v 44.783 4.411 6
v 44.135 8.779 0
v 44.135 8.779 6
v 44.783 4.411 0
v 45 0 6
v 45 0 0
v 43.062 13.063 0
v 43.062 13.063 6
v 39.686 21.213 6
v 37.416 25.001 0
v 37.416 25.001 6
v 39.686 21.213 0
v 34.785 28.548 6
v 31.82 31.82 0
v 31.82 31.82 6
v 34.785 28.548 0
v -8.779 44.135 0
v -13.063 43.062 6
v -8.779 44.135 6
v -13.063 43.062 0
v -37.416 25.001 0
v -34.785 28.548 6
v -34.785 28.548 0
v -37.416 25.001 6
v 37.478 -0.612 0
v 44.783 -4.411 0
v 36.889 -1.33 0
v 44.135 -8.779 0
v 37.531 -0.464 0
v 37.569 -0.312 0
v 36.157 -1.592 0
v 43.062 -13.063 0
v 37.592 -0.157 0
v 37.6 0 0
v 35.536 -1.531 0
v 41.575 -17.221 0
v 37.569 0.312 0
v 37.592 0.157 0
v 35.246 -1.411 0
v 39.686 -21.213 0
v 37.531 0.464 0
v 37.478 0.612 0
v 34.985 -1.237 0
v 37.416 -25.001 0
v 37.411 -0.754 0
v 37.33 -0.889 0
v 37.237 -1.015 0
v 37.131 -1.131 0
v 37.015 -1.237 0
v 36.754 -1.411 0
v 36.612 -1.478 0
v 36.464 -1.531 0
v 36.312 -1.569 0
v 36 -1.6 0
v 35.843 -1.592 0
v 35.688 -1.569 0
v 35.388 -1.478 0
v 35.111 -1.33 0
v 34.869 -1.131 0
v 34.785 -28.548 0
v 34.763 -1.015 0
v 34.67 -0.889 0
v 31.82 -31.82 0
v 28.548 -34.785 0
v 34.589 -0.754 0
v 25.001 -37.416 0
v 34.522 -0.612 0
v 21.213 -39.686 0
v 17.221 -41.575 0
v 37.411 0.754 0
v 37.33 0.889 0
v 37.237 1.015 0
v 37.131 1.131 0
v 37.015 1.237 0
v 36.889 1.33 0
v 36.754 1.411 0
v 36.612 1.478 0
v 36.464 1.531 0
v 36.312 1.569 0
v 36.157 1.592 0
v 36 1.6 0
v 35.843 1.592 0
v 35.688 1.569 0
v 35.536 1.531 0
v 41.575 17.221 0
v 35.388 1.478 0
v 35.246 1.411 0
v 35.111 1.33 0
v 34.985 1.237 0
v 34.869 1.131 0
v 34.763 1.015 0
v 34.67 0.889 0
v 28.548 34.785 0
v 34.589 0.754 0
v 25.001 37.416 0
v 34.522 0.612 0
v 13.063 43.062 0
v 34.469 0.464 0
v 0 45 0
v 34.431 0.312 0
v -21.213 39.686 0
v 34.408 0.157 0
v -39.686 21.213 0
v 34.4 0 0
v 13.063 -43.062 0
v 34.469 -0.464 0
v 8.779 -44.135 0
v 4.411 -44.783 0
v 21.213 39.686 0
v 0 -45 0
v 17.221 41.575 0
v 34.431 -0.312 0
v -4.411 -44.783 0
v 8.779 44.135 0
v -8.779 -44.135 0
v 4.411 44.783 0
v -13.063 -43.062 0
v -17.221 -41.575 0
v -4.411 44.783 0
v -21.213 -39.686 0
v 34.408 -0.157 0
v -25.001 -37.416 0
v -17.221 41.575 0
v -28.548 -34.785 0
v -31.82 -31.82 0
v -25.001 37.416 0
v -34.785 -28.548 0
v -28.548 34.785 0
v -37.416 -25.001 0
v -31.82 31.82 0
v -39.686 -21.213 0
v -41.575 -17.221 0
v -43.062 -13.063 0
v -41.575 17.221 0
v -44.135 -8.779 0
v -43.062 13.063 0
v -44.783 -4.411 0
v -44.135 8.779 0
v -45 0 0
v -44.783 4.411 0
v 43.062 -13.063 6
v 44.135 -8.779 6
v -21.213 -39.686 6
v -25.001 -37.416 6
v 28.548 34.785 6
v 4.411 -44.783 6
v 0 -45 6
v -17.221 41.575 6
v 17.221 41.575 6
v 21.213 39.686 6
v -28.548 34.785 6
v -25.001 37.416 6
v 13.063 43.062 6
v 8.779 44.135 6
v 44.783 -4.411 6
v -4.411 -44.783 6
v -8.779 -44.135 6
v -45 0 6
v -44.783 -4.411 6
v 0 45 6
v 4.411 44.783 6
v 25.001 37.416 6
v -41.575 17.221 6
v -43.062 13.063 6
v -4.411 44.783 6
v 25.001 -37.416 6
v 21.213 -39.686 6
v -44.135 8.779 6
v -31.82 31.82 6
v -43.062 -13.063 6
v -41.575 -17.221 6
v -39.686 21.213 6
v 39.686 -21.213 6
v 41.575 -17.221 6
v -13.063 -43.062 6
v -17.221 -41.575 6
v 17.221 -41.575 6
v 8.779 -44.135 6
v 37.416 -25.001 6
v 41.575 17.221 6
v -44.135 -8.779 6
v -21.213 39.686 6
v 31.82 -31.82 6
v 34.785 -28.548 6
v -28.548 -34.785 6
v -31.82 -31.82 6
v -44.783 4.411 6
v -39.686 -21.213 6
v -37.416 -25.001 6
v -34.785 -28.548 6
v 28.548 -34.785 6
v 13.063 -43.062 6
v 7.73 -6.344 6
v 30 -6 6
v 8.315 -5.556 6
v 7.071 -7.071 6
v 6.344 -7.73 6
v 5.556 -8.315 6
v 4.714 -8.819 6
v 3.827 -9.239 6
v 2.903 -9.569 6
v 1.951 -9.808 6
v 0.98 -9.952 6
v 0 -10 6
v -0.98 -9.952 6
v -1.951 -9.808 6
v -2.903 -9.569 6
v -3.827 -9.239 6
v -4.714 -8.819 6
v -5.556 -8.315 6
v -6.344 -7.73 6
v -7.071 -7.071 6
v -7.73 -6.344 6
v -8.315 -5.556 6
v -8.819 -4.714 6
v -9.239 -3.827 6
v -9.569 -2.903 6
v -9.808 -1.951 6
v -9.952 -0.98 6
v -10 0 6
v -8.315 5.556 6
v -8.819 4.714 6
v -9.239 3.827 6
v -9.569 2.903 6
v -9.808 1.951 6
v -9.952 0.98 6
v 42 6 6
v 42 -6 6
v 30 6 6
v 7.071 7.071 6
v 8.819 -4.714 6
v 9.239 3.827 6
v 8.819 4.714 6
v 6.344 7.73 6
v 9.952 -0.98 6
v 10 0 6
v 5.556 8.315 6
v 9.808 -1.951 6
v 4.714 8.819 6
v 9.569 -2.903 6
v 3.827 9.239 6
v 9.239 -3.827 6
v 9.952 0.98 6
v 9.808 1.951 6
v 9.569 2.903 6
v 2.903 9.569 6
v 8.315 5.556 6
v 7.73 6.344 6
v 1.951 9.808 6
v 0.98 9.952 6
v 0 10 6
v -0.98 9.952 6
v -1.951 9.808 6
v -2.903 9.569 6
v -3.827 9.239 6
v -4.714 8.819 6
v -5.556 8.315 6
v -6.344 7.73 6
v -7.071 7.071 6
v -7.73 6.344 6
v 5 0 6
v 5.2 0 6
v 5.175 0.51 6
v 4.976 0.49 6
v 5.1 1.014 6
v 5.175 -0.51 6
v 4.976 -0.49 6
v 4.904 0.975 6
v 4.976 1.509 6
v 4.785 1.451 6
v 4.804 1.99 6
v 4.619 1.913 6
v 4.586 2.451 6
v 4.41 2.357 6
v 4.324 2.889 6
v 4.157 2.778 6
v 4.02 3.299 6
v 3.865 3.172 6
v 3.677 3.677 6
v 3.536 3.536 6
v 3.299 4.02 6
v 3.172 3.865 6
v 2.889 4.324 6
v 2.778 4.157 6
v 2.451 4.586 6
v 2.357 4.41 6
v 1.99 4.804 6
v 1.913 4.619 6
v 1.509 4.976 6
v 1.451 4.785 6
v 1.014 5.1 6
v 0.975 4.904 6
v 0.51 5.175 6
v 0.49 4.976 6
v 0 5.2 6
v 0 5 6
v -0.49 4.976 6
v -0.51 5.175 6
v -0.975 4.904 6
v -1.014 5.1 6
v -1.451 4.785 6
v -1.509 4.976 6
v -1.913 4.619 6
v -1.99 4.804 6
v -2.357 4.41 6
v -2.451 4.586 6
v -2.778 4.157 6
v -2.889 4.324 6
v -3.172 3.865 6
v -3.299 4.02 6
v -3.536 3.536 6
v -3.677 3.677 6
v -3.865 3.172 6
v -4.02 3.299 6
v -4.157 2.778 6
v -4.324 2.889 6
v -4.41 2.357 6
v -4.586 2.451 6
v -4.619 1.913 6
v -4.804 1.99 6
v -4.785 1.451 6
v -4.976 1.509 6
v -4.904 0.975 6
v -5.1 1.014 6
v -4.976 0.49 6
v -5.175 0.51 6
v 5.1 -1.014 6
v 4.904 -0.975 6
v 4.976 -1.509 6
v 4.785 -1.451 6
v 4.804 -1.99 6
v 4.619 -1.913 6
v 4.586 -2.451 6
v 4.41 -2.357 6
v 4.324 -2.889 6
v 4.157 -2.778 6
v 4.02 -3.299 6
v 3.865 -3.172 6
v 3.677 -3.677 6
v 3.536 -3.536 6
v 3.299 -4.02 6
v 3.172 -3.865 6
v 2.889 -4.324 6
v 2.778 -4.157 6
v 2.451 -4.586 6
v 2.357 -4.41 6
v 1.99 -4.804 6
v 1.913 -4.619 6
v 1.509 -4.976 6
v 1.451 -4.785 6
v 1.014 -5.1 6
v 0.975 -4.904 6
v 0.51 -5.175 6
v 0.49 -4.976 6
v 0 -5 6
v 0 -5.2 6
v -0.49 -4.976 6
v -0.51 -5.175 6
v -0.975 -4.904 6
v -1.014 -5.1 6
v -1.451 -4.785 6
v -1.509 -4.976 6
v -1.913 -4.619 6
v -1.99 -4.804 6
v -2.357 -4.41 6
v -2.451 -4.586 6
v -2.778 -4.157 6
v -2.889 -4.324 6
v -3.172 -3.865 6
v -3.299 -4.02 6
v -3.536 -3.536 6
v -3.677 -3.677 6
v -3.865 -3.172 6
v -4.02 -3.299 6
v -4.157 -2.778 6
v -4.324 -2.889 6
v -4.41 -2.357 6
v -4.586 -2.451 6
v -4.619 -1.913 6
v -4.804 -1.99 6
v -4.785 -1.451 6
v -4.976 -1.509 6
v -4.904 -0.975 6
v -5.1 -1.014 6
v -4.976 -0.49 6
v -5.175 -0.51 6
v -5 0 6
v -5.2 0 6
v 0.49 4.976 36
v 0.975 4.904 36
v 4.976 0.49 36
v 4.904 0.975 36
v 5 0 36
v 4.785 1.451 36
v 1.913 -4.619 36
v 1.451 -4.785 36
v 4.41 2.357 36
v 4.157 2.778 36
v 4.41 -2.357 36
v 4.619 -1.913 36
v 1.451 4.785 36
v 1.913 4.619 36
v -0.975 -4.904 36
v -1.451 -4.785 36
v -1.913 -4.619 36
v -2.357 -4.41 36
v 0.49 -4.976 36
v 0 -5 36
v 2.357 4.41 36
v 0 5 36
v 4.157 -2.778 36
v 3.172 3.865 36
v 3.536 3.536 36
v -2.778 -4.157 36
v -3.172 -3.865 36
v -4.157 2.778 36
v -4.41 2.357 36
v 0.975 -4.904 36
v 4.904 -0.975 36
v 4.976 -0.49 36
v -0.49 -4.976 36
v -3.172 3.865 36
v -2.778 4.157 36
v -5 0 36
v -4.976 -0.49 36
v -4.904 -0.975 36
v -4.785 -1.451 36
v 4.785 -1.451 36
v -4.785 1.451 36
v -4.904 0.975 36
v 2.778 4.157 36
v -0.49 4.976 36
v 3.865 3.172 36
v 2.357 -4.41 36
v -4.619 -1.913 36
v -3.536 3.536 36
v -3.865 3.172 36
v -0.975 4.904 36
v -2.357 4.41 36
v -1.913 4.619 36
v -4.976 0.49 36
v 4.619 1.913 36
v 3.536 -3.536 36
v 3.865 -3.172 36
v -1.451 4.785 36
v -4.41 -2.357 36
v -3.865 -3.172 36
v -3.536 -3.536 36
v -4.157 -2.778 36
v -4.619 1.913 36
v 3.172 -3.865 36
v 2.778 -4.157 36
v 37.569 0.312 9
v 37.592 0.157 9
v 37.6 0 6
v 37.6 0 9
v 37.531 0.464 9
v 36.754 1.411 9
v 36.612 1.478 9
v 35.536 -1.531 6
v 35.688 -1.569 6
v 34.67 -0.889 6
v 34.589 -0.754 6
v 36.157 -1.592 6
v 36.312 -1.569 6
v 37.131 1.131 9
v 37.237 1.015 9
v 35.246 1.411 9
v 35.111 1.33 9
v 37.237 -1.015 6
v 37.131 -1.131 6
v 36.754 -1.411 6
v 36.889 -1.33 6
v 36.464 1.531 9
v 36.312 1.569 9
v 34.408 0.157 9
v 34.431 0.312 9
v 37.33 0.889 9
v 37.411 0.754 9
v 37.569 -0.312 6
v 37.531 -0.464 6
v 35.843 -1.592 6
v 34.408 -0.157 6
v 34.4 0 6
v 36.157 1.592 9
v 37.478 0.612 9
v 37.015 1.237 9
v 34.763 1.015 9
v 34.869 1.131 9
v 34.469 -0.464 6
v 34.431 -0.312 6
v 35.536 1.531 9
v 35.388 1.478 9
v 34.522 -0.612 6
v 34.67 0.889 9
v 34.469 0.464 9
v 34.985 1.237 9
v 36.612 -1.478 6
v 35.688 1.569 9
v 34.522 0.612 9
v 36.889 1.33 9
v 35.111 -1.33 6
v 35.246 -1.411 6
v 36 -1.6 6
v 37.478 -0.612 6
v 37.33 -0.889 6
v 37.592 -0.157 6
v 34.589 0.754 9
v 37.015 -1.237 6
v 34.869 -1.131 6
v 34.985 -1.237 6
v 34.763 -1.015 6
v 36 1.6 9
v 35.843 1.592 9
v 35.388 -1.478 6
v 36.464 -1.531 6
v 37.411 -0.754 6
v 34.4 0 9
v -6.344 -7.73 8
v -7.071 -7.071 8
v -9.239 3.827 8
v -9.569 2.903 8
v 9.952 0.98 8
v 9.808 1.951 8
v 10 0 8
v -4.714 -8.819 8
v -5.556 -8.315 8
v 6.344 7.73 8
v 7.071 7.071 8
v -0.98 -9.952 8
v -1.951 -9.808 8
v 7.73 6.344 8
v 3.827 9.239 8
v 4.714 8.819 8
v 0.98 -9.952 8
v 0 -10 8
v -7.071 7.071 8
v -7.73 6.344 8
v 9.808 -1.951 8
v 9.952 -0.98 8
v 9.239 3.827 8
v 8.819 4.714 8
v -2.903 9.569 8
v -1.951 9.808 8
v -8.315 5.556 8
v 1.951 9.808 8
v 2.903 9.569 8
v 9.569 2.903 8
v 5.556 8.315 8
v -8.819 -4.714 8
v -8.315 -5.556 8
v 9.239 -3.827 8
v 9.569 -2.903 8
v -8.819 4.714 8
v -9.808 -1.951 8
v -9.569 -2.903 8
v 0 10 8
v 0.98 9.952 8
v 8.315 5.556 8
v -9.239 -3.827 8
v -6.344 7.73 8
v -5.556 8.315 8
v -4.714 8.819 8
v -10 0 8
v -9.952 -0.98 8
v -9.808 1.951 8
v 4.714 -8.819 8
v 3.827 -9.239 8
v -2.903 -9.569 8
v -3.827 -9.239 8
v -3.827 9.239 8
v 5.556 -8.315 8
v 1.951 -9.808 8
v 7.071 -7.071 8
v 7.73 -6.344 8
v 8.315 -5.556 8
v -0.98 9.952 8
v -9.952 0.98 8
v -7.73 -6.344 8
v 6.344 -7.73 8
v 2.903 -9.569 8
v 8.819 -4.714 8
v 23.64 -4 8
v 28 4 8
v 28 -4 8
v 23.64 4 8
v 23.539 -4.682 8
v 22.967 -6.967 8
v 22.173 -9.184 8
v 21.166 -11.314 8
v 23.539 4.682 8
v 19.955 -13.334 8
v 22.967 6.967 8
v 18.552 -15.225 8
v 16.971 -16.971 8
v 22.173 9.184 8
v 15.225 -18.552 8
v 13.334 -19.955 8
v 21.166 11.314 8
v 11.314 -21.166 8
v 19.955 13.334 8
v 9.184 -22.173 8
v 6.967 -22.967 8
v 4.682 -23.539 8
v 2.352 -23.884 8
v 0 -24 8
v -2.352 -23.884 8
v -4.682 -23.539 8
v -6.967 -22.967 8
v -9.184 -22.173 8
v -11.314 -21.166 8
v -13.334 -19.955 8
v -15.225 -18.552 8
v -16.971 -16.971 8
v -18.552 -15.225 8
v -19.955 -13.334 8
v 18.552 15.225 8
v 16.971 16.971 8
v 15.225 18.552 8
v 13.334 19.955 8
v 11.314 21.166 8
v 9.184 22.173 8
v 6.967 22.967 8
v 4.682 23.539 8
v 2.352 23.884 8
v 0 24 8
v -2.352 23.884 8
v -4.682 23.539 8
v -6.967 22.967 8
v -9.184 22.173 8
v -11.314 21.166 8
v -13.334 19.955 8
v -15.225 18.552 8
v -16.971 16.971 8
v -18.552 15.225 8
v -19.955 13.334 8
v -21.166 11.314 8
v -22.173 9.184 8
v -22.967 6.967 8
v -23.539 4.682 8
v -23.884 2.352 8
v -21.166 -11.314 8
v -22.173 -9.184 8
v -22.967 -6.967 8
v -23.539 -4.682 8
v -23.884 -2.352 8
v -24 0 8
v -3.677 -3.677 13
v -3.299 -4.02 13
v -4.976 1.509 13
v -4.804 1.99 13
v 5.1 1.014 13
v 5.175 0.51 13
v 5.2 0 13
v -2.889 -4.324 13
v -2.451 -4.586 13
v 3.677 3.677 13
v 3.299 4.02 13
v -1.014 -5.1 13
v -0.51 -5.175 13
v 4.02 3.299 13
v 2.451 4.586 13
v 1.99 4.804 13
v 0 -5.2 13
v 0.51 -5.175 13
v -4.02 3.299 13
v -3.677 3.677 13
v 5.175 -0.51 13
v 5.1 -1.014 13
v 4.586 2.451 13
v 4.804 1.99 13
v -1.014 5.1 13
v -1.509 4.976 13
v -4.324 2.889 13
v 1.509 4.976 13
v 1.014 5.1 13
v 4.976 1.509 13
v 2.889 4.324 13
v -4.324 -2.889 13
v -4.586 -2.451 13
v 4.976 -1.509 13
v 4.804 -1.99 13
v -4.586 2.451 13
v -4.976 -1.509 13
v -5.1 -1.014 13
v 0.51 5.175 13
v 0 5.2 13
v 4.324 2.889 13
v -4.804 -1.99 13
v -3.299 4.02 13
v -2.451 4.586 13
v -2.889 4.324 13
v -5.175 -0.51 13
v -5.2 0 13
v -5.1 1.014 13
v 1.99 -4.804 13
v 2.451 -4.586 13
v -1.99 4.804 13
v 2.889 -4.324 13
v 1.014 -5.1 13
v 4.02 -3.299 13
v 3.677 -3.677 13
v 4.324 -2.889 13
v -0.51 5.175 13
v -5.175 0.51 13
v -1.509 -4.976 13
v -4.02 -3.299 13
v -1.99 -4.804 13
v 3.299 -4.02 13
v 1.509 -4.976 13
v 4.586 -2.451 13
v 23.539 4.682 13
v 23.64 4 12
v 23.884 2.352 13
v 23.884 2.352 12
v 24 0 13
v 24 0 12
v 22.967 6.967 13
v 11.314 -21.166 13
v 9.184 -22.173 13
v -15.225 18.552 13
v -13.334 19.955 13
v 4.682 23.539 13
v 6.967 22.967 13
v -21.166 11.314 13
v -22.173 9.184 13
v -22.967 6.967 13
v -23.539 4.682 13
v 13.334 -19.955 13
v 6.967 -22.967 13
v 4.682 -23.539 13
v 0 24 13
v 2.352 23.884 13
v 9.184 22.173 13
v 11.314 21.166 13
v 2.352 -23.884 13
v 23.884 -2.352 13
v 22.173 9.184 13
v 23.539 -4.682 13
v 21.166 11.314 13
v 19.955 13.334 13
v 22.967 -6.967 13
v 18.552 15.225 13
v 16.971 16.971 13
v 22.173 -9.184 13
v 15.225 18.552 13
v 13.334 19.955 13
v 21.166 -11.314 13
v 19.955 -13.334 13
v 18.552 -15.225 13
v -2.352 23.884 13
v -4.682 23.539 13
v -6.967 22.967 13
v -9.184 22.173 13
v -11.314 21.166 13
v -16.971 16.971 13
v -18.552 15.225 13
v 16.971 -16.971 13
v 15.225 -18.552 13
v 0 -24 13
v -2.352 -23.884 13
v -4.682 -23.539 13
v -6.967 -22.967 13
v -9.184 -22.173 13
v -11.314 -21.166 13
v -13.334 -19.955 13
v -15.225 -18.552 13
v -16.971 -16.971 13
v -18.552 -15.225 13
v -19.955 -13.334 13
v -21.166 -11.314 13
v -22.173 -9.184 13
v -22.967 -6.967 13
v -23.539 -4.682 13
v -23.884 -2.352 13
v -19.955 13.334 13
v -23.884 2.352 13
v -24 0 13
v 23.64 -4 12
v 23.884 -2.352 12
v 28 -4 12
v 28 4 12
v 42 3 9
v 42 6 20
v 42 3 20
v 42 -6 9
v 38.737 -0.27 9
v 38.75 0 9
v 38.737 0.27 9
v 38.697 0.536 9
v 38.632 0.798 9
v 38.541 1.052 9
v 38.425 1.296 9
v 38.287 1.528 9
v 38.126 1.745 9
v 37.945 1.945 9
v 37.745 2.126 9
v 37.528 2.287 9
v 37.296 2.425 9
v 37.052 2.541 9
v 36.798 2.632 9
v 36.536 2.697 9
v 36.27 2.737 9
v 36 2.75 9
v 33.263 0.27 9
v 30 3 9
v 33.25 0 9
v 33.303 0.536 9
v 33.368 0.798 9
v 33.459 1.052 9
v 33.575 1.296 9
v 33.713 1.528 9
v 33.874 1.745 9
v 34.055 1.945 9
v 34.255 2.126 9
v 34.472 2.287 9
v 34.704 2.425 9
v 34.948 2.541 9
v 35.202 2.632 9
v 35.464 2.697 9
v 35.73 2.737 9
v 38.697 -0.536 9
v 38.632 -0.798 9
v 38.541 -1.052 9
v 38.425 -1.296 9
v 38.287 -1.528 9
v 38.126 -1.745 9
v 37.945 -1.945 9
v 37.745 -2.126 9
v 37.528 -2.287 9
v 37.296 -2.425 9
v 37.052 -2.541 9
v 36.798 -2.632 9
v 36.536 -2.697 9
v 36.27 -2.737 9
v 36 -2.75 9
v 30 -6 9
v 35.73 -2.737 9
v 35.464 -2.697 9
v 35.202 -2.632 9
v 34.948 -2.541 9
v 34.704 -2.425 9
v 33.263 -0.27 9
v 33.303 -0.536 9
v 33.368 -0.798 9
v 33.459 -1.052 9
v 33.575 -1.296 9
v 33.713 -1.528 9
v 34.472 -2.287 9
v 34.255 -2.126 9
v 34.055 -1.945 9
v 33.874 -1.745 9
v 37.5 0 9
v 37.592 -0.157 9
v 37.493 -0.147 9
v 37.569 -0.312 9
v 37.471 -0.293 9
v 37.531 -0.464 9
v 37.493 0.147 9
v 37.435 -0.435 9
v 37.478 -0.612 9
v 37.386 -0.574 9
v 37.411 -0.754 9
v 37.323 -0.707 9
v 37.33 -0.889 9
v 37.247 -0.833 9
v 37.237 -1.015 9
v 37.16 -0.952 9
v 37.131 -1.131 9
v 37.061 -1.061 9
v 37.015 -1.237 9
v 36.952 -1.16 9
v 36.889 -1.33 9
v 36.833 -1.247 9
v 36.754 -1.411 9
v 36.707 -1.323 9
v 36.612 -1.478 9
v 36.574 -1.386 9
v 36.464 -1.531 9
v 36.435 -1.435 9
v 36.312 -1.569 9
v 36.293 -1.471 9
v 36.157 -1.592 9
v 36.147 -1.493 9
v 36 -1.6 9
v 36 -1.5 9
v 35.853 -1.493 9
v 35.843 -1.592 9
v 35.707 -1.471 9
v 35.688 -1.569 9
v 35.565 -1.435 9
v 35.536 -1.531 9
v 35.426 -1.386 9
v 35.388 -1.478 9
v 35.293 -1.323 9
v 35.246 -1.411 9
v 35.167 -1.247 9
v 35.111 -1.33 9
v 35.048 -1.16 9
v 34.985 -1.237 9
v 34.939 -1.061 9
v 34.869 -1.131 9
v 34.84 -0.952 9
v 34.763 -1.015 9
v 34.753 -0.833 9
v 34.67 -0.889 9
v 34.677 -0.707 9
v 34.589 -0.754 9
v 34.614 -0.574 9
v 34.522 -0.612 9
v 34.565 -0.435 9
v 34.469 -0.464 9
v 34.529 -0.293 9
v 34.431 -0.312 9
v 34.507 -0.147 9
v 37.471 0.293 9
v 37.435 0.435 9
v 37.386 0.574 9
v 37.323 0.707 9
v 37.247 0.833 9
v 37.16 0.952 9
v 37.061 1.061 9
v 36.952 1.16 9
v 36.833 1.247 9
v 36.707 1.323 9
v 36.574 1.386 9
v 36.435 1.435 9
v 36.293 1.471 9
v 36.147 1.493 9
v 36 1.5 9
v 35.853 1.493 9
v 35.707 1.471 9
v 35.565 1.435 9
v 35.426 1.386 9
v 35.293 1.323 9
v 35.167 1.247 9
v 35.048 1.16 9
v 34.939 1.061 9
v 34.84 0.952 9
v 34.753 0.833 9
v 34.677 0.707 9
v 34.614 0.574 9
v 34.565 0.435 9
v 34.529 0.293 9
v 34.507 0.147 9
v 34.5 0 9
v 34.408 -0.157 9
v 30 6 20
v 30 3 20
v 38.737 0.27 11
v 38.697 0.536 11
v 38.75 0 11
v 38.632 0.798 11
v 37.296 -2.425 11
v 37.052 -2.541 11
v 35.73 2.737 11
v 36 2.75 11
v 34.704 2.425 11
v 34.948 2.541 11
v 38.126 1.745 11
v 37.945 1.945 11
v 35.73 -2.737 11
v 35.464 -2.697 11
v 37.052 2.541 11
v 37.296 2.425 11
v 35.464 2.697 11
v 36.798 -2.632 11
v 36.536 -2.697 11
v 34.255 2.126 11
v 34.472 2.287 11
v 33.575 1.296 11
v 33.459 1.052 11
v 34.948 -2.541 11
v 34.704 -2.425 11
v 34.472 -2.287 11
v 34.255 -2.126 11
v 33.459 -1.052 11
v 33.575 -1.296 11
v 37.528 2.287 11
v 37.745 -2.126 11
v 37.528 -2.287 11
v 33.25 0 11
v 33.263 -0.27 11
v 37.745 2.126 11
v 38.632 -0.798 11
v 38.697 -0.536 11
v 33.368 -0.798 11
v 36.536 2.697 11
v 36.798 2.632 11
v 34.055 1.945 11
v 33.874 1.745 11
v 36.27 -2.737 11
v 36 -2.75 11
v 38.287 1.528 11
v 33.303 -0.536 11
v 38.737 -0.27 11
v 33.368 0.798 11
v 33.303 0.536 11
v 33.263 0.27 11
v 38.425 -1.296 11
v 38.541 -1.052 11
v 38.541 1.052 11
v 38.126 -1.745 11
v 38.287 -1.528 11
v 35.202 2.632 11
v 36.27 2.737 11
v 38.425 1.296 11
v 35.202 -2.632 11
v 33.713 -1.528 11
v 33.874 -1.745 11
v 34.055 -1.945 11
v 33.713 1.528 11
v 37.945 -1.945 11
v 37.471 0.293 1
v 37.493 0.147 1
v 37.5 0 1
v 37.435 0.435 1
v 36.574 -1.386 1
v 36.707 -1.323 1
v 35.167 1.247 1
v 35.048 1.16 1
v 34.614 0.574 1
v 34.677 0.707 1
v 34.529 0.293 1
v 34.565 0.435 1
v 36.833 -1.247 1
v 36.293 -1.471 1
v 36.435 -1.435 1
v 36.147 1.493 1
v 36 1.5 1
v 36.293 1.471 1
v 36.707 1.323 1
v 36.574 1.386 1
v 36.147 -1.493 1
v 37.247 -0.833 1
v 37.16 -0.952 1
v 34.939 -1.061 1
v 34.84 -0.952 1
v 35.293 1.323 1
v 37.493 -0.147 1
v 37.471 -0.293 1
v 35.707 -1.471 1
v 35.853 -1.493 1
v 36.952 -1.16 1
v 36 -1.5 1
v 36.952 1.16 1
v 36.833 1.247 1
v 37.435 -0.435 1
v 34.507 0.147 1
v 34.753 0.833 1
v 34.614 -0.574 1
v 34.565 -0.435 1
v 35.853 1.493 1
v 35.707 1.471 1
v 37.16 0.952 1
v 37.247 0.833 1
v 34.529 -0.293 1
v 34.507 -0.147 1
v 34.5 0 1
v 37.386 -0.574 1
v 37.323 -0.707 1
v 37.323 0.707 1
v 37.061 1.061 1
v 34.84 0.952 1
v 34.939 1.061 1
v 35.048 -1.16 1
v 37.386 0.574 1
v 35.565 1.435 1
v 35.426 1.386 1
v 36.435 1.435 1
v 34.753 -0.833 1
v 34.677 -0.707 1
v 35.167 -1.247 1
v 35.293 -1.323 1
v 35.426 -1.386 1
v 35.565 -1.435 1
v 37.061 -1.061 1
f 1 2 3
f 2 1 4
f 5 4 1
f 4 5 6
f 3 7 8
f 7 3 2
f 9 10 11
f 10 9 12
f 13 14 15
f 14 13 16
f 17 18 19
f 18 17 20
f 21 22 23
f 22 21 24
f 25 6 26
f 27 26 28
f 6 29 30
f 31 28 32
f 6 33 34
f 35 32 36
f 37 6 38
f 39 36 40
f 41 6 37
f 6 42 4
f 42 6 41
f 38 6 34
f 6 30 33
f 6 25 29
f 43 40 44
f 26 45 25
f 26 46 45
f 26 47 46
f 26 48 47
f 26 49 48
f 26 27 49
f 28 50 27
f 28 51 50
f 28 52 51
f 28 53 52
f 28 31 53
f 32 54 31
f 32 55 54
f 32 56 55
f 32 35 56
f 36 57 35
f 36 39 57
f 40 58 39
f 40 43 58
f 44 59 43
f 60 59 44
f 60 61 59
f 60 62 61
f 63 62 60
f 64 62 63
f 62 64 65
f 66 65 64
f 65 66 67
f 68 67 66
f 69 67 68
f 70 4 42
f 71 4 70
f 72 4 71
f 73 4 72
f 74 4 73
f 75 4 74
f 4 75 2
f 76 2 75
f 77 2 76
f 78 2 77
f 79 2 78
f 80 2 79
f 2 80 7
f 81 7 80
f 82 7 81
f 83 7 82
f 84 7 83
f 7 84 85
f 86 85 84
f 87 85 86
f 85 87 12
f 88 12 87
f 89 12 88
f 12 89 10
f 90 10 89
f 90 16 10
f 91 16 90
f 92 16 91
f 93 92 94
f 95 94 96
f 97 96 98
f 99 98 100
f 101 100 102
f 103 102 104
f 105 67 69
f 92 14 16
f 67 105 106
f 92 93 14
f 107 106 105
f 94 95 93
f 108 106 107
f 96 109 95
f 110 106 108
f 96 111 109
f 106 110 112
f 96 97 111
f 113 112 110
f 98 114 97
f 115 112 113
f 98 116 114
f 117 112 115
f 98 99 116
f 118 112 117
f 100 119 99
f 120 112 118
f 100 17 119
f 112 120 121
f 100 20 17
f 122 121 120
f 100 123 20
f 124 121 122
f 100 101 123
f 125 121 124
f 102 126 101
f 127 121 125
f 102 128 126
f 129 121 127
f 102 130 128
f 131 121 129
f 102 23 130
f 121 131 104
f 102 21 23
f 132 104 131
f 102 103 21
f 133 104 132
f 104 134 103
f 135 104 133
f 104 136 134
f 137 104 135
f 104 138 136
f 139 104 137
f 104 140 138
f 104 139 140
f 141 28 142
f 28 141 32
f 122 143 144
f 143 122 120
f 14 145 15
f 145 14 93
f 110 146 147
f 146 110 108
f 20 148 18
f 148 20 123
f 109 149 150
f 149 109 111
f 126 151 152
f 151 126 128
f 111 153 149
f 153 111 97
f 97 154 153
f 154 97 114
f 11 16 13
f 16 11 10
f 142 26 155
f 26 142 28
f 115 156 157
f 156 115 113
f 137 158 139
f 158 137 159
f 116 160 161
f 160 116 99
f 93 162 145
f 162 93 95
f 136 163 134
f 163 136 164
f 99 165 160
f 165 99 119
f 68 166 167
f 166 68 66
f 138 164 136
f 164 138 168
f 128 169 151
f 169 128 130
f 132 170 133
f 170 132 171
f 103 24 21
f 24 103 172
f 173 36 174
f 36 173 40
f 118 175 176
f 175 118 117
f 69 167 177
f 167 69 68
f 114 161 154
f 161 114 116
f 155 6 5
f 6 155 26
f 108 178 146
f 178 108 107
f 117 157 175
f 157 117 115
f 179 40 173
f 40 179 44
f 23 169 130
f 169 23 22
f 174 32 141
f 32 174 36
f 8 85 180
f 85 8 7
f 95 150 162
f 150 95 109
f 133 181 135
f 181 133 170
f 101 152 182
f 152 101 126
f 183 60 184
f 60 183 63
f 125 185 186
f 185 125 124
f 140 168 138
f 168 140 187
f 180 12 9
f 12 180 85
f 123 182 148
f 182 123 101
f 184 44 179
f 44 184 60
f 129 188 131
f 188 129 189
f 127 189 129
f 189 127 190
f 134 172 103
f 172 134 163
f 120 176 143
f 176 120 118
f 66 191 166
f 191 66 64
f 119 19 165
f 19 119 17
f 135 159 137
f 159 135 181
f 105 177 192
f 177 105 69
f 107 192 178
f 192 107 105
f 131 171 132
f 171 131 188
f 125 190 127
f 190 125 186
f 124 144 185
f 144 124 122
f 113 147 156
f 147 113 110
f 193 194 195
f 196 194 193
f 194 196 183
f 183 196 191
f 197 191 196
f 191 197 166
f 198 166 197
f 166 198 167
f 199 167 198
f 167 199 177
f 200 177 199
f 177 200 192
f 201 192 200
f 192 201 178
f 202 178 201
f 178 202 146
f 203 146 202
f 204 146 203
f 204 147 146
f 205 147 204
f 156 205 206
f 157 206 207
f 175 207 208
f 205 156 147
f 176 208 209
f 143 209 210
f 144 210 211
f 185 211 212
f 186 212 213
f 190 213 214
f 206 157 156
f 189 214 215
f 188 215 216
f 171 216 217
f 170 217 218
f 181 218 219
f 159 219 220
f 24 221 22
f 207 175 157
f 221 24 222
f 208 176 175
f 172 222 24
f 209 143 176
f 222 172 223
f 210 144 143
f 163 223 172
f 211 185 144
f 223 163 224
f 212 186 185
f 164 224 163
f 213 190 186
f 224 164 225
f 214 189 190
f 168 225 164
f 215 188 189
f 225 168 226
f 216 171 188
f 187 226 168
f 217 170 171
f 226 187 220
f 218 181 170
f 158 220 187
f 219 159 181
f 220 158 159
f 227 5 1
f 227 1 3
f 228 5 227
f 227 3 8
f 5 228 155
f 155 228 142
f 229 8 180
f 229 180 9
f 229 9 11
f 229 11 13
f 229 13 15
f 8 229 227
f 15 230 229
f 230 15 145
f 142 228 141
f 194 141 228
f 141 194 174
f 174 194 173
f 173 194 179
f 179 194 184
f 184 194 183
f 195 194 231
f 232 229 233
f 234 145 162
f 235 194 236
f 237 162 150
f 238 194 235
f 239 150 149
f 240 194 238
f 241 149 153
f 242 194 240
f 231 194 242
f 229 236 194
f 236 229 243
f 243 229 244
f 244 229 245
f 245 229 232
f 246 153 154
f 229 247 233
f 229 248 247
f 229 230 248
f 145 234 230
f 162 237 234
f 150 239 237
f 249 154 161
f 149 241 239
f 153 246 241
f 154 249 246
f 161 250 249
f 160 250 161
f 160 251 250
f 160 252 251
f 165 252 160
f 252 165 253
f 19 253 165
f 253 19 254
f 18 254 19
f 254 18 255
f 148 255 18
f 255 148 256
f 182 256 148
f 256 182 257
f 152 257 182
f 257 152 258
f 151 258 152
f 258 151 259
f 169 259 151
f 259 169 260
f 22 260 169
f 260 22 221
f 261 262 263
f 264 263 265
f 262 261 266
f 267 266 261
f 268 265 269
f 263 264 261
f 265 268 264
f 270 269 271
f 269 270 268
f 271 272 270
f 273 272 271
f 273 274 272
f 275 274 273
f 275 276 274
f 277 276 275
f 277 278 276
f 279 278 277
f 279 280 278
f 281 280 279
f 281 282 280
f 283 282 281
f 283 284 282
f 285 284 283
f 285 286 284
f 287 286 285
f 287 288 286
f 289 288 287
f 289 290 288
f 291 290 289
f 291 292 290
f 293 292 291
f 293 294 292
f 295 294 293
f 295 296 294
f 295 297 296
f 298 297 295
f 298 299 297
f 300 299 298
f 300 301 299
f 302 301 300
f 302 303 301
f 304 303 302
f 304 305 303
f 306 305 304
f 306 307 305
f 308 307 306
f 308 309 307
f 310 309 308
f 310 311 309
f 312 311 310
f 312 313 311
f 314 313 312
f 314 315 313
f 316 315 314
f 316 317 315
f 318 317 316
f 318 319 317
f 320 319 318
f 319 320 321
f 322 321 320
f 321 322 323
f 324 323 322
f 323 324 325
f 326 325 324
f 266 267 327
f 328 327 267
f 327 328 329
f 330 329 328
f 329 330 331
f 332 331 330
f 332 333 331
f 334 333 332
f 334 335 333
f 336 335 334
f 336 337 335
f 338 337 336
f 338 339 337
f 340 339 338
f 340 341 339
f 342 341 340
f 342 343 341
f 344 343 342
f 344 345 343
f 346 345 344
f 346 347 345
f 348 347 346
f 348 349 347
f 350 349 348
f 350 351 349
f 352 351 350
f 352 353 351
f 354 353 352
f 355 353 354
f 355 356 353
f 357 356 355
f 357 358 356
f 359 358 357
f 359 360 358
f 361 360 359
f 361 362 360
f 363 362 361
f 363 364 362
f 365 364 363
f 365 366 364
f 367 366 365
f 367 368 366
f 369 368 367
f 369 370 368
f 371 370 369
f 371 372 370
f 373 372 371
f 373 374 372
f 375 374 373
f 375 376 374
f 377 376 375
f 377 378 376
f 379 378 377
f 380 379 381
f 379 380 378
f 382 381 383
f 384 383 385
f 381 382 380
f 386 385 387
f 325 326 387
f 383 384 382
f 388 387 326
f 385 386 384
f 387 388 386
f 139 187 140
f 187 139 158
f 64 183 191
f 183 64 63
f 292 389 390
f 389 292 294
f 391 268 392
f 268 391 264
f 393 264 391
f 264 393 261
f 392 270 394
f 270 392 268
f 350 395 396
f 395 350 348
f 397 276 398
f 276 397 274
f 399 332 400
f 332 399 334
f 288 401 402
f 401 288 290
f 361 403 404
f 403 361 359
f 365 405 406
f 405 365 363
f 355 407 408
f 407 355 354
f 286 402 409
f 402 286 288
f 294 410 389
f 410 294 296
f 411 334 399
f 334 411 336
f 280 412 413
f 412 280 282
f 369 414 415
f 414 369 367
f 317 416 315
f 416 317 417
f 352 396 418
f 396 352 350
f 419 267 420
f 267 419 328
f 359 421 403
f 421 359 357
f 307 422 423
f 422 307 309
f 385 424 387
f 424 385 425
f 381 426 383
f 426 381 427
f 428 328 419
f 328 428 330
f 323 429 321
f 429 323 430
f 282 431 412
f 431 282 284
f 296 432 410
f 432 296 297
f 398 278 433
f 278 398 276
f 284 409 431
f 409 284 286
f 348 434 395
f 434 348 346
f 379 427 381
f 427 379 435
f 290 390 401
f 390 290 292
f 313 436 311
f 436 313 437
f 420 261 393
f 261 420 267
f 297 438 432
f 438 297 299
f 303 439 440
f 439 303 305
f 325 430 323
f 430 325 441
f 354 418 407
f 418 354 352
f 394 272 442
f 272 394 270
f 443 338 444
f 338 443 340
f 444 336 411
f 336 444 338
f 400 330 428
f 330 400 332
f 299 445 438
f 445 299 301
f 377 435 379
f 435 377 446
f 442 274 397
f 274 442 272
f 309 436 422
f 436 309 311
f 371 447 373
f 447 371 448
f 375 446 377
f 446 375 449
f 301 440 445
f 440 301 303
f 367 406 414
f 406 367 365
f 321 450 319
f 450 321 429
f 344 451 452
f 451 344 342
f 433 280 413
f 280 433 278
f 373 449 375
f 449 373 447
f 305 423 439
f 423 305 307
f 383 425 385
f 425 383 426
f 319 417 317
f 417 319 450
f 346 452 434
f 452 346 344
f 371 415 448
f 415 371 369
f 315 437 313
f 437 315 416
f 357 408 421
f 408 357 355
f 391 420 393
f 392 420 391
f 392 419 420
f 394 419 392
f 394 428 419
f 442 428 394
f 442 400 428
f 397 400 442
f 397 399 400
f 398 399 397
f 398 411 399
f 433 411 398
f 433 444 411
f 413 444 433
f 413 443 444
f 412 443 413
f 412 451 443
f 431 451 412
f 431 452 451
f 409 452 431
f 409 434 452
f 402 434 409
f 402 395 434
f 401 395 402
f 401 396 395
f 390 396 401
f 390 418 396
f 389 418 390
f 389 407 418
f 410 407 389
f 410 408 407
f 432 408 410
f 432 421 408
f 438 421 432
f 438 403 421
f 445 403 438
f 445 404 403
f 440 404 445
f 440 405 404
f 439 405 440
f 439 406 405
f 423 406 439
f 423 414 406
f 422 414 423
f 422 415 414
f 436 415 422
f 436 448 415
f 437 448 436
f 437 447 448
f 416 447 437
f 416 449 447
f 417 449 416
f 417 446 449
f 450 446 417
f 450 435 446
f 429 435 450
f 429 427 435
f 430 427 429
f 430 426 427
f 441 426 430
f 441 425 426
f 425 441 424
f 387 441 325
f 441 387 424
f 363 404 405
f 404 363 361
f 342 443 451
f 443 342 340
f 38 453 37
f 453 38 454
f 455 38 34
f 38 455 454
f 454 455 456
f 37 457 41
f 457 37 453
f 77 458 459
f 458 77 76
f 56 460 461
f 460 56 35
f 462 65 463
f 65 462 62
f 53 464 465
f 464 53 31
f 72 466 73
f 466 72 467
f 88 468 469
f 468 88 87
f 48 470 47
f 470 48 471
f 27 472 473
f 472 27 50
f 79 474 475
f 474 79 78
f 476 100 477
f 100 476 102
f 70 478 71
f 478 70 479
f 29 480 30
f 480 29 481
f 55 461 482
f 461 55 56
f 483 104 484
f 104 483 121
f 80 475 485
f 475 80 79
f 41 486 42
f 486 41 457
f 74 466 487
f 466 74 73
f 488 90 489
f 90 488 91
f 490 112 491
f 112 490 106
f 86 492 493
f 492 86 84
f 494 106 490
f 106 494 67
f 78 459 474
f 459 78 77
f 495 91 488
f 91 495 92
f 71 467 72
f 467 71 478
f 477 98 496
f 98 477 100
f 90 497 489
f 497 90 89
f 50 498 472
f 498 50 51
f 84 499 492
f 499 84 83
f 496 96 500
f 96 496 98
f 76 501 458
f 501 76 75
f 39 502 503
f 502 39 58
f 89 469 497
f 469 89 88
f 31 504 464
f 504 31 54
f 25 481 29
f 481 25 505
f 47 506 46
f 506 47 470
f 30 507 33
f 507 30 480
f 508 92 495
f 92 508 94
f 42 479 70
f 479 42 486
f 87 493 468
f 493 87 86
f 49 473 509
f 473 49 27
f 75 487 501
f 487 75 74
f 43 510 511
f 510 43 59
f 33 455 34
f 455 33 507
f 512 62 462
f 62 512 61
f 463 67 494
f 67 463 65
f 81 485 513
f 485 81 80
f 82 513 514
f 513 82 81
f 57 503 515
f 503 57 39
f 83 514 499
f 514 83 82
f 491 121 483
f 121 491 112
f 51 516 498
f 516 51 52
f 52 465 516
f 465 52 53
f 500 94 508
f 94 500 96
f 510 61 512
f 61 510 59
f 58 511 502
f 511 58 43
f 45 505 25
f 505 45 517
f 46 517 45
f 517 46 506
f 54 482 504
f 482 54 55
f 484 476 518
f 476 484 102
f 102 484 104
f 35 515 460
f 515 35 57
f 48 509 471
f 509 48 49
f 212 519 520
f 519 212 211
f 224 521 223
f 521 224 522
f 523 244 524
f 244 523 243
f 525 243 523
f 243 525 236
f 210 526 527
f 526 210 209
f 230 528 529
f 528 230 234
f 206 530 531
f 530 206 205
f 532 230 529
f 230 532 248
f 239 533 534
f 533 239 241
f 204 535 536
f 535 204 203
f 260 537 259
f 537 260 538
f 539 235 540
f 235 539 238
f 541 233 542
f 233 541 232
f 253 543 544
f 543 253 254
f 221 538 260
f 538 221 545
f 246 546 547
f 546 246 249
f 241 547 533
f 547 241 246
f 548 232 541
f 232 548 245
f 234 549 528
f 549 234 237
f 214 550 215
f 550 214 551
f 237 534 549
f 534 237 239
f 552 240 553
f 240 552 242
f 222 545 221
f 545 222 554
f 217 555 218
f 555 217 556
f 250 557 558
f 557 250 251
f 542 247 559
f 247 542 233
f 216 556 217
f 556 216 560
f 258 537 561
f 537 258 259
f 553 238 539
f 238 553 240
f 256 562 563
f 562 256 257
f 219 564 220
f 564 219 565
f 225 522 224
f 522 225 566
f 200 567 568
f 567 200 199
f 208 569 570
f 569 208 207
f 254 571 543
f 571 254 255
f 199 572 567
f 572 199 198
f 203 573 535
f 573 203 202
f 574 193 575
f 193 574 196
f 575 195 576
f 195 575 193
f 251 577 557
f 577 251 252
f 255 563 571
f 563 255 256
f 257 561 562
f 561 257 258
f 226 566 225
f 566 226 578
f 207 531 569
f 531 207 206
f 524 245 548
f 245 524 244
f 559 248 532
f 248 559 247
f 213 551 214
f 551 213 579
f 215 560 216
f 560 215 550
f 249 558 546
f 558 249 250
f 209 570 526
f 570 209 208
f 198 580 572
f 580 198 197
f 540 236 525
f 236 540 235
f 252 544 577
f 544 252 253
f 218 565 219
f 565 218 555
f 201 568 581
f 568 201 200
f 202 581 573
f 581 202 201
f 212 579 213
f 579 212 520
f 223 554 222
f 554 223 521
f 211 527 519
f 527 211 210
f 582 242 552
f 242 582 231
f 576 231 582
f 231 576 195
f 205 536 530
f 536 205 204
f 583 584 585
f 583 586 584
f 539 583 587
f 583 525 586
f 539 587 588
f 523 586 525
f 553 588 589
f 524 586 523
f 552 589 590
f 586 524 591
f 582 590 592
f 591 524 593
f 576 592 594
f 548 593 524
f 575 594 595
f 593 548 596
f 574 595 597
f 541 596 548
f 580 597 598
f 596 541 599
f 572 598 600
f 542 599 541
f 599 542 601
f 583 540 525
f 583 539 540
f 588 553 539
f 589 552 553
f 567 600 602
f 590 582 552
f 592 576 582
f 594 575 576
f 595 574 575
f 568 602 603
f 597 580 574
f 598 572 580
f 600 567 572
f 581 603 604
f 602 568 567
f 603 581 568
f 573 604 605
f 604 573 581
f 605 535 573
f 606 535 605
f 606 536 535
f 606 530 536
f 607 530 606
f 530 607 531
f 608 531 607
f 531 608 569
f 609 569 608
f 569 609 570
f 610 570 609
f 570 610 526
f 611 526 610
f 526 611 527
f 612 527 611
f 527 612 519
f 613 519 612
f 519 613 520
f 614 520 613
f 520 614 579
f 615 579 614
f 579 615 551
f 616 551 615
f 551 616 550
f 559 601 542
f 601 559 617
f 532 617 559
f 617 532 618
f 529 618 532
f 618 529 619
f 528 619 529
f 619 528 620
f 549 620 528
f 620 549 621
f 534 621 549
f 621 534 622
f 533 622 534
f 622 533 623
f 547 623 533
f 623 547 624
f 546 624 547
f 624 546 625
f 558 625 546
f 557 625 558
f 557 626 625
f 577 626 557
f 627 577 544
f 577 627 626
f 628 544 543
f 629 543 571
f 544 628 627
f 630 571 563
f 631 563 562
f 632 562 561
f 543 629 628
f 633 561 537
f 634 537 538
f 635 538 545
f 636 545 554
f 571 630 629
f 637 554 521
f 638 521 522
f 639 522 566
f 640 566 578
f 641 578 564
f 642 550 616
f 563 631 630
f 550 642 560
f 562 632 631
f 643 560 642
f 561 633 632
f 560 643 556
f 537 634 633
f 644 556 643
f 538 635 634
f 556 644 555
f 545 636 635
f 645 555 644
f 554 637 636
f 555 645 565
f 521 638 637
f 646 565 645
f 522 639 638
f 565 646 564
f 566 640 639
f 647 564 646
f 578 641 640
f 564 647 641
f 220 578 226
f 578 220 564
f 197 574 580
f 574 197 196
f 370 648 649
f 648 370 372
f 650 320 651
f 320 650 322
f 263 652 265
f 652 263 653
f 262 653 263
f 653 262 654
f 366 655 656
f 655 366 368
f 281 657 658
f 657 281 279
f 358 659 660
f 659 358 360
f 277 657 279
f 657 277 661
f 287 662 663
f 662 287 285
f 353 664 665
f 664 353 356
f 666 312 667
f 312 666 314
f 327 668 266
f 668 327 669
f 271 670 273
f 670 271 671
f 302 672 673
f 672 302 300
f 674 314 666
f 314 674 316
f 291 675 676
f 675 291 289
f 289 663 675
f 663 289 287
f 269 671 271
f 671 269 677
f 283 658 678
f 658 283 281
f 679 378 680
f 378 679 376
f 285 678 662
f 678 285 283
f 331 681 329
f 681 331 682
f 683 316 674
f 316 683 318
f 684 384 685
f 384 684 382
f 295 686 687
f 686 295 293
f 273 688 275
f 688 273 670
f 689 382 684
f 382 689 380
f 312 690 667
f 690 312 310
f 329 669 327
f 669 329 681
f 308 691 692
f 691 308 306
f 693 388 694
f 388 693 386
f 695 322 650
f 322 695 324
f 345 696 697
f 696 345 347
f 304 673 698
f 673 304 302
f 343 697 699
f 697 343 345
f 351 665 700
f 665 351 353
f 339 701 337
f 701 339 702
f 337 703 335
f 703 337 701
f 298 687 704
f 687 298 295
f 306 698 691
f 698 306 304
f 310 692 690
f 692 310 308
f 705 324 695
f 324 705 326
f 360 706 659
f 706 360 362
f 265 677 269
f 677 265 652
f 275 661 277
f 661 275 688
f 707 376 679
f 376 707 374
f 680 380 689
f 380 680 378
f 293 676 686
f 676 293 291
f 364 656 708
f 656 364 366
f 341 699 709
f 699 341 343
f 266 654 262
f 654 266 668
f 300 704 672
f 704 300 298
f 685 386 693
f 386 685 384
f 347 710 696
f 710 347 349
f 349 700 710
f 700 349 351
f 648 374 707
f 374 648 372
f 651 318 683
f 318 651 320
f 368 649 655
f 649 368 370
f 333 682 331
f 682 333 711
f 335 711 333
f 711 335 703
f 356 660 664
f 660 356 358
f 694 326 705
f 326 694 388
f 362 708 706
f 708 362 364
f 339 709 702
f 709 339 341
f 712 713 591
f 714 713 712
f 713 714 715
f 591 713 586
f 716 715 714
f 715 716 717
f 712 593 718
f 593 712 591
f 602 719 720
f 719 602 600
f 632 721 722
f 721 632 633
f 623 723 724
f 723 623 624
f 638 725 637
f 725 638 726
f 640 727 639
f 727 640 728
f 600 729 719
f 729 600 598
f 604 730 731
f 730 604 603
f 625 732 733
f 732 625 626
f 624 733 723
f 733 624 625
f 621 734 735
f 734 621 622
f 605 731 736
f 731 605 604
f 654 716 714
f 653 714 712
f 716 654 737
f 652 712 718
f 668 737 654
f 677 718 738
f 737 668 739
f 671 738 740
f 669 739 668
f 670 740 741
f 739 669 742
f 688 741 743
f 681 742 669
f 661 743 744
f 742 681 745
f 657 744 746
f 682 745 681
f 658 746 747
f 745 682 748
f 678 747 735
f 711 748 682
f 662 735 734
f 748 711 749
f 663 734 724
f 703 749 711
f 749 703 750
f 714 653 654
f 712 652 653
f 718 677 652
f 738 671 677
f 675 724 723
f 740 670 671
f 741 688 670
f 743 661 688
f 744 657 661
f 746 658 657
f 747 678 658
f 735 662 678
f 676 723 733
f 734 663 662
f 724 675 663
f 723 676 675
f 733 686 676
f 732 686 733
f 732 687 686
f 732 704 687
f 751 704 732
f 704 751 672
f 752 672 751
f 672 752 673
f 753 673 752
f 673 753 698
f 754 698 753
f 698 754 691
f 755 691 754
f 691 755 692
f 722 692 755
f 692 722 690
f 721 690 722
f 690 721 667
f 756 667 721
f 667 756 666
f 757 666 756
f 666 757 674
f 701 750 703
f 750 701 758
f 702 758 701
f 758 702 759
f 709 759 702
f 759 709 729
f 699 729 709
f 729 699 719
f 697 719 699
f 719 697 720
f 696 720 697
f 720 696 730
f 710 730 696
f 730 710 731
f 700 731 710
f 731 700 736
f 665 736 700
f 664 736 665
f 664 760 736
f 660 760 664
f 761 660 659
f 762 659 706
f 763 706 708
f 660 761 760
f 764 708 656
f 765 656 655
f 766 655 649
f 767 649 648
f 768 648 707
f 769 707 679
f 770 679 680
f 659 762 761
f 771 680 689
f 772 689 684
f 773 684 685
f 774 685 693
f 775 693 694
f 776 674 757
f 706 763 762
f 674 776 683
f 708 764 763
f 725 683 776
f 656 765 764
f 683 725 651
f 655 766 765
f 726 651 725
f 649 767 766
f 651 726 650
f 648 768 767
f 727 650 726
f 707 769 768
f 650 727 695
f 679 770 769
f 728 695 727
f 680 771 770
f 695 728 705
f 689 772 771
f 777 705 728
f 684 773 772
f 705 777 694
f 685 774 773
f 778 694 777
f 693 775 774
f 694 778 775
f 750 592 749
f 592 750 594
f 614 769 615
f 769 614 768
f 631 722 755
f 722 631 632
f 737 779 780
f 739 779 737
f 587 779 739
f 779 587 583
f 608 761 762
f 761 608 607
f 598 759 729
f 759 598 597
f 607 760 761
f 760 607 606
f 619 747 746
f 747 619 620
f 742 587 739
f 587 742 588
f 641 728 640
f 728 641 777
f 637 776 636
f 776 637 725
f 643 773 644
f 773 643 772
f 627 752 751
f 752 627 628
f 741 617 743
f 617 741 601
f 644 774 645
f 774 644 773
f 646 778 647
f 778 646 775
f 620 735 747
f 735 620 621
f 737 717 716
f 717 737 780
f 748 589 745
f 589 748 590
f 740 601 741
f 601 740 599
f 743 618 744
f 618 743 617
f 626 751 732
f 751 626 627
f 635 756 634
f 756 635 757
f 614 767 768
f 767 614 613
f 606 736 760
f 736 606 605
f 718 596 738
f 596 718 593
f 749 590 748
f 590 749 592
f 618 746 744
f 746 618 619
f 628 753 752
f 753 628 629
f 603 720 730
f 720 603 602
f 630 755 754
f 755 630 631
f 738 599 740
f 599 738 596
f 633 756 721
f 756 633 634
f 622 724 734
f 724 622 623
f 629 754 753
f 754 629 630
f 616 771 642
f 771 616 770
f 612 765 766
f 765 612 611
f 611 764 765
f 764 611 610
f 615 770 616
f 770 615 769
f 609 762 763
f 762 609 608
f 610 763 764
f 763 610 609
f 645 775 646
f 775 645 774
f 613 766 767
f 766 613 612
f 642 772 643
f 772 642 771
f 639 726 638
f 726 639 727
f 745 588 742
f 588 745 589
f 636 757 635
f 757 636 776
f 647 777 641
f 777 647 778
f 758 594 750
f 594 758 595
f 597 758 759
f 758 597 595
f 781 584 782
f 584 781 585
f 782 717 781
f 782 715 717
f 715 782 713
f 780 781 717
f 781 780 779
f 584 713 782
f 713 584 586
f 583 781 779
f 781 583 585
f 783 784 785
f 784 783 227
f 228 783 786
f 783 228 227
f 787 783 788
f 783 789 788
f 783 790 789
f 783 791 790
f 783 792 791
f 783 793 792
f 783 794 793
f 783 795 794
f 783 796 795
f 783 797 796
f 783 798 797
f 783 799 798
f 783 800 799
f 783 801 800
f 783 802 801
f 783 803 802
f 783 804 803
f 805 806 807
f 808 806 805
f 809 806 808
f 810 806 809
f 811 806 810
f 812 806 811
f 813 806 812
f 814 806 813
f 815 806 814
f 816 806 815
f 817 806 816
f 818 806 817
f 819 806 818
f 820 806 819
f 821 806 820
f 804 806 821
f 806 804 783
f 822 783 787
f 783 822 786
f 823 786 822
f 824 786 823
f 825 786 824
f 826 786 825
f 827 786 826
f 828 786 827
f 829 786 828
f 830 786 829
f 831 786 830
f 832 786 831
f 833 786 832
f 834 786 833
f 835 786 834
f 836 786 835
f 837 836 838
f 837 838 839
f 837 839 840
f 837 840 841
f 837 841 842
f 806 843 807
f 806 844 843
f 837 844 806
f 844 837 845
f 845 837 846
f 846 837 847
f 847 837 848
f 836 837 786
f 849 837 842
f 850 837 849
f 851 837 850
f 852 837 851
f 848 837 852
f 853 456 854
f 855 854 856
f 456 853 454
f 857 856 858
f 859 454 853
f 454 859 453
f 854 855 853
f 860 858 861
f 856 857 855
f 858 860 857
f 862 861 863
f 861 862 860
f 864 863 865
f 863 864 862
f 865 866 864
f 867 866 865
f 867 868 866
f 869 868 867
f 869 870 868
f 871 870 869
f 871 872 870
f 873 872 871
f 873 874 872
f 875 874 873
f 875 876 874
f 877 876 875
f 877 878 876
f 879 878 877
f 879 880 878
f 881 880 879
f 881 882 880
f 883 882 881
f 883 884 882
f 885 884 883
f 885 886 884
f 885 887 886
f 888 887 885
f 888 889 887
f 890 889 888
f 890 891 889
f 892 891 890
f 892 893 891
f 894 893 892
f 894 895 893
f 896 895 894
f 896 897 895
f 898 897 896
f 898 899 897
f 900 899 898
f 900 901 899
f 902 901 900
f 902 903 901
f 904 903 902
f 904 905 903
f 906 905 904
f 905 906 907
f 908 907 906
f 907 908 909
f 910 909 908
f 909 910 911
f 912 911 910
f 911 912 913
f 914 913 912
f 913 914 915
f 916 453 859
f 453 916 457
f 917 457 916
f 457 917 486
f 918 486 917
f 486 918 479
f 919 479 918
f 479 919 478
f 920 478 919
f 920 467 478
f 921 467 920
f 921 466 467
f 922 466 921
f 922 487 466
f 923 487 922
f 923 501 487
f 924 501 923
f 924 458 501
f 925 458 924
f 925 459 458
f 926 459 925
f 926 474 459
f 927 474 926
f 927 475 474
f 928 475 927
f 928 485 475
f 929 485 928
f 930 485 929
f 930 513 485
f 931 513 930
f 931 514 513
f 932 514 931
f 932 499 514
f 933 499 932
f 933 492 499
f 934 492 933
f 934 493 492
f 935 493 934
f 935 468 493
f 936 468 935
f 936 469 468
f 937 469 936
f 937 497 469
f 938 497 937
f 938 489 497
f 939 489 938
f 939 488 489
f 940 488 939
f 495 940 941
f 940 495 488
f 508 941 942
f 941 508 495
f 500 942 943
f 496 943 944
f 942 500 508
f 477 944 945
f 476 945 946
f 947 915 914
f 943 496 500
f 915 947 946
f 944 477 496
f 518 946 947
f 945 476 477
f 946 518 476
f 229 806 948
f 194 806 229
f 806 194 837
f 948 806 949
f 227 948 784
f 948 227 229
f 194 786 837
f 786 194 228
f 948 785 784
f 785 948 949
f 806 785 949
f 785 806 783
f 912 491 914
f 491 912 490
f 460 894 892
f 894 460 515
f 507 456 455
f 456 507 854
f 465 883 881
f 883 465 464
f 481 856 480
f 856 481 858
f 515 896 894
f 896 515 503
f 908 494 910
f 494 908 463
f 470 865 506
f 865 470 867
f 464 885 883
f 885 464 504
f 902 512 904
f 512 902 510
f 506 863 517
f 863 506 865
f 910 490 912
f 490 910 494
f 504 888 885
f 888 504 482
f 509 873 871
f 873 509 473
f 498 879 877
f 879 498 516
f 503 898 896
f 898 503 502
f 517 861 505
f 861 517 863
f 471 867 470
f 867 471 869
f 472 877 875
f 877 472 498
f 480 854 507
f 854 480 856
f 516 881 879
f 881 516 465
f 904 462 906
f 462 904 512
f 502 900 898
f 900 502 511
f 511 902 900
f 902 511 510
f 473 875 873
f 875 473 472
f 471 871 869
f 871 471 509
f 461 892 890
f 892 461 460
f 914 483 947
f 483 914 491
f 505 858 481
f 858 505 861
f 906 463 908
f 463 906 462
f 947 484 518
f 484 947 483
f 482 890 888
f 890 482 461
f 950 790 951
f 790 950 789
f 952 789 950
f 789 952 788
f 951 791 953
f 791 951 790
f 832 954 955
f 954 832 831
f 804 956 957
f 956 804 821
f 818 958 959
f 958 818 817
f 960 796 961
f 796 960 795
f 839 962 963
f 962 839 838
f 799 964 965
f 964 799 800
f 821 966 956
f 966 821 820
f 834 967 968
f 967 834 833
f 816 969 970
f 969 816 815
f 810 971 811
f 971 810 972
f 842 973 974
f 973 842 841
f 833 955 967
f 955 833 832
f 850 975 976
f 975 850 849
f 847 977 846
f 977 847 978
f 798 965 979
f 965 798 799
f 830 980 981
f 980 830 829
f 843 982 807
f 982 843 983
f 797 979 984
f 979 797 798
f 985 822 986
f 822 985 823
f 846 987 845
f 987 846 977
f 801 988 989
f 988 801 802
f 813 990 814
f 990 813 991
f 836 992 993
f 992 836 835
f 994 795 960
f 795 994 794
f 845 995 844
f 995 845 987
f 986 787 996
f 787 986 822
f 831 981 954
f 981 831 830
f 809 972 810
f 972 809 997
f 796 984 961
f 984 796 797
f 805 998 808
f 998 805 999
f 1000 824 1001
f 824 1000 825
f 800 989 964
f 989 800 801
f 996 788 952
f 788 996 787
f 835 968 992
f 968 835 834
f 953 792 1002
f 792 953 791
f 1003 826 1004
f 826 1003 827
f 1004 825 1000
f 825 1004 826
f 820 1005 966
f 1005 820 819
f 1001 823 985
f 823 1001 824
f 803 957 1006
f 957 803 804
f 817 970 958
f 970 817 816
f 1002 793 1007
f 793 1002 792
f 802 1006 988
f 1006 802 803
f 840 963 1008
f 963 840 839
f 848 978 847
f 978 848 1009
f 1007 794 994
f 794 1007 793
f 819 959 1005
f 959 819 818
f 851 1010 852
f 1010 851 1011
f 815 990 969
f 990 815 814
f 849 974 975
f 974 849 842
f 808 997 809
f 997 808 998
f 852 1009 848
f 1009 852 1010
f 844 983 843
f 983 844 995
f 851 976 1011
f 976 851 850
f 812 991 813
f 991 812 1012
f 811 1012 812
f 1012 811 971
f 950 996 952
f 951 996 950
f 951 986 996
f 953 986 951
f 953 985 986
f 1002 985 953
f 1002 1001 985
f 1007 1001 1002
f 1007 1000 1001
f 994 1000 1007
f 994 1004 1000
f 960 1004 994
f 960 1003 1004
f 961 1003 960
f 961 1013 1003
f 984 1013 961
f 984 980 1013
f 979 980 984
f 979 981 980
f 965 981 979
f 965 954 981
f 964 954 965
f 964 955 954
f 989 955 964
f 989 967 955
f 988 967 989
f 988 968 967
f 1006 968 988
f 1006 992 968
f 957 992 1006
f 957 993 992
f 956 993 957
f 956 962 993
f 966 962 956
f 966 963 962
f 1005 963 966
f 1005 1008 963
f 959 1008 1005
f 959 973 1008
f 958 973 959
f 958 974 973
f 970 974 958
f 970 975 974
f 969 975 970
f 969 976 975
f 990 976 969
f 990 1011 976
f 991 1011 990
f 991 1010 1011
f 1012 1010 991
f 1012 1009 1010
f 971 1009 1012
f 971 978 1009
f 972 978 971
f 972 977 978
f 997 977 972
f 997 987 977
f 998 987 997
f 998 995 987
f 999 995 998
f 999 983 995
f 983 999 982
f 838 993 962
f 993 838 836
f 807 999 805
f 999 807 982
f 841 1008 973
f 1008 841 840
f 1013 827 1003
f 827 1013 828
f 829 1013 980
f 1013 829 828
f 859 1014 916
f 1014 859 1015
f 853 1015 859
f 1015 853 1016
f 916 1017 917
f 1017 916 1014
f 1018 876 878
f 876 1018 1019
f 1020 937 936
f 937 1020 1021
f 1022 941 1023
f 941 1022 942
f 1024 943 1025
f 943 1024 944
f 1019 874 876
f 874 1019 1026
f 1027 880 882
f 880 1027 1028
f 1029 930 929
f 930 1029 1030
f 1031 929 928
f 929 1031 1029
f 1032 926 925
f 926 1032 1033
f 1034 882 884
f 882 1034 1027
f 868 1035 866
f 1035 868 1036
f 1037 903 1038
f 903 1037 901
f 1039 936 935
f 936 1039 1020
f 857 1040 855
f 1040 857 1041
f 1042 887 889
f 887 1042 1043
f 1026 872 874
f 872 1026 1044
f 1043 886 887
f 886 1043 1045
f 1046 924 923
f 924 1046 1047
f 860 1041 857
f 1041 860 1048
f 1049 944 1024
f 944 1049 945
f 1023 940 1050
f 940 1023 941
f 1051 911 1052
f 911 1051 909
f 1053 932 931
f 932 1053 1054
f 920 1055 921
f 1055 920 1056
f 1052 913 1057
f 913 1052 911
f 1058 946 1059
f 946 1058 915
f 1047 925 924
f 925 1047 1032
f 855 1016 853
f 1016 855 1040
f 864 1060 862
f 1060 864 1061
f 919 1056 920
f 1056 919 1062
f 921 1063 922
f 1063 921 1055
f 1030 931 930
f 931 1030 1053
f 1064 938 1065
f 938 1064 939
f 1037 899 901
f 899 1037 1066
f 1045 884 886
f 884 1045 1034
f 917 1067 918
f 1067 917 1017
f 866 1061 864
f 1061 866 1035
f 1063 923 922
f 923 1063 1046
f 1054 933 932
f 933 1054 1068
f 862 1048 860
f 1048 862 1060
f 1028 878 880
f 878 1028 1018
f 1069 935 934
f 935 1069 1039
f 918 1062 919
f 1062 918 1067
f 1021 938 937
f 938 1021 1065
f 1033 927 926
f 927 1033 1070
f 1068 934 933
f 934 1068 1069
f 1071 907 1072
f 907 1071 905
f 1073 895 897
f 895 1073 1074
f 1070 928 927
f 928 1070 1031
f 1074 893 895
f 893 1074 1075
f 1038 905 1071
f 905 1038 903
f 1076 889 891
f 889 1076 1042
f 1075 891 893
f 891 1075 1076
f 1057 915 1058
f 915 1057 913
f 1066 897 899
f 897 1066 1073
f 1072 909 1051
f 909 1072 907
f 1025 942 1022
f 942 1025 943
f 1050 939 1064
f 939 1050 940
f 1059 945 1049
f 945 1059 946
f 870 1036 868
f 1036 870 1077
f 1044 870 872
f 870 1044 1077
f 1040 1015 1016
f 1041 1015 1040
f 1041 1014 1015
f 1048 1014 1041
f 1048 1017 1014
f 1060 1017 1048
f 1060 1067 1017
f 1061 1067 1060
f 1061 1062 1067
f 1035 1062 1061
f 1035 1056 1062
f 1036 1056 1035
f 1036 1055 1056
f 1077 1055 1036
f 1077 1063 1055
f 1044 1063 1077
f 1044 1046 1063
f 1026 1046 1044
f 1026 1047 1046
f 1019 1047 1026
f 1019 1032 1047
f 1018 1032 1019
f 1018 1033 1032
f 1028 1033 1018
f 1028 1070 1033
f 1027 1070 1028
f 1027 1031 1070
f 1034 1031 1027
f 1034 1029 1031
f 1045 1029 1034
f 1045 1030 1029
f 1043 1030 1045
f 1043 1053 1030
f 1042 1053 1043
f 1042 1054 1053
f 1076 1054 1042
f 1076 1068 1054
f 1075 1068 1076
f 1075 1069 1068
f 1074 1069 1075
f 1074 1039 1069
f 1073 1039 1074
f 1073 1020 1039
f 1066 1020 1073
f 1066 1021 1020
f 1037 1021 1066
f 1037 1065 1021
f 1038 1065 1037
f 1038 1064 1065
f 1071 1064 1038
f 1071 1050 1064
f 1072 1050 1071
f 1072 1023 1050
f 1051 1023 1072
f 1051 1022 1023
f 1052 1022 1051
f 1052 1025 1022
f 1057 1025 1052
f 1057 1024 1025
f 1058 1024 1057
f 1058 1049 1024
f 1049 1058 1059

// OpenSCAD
// Sample model for examples/checks/turntable.yaml.
//
// A small hand turntable: a base plate with a centre post, a platter that
// turns on that post over a purchased thrust washer, and an L-bracket bolted
// to the base with an M3 screw. Dimensions are millimetres.
//
// The check file drives each module separately, so the top-level
// instantiations at the bottom of this file are only for `render` and for
// opening the file in the OpenSCAD GUI.

$fn = 64;

BASE_D    = 90;    // base plate diameter
BASE_H    = 6;     // base plate thickness
POST_D    = 10;    // centre post diameter
POST_TOP  = 36;    // centre post top, from the base underside
BOLT_D    = 3.2;   // clearance hole for an M3 screw
BOLT_R    = 36;    // bolt circle radius

WASHER_ID = 10.4;  // purchased thrust washer
WASHER_OD = 20;
WASHER_T  = 2;

PLATTER_D = 48;    // platter diameter
PLATTER_H = 5;     // platter thickness
PLATTER_Z = 8;     // platter underside = base top + washer thickness
BORE_D    = 10.4;  // 0.2 mm radial running clearance on the post
LUG_L     = 5;     // finger lug on the platter rim
LUG_W     = 8;
LUG_H     = 4;

BRACKET_W = 12;    // bracket footprint, square
BRACKET_T = 3;     // bracket wall thickness
BRACKET_H = 14;    // bracket upright height

module base() {
    difference() {
        union() {
            cylinder(d = BASE_D, h = BASE_H);
            cylinder(d = POST_D, h = POST_TOP);
        }
        translate([BOLT_R, 0, -1]) cylinder(d = BOLT_D, h = BASE_H + 2);
    }
}

module platter() {
    difference() {
        union() {
            cylinder(d = PLATTER_D, h = PLATTER_H);
            translate([PLATTER_D / 2 - 1, -LUG_W / 2, 0]) cube([LUG_L, LUG_W, LUG_H]);
        }
        translate([0, 0, -1]) cylinder(d = BORE_D, h = PLATTER_H + 2);
    }
}

module bracket() {
    difference() {
        union() {
            cube([BRACKET_W, BRACKET_W, BRACKET_T]);
            translate([0, BRACKET_W - BRACKET_T, 0]) cube([BRACKET_W, BRACKET_T, BRACKET_H]);
        }
        translate([BRACKET_W / 2, BRACKET_W / 2, -1]) cylinder(d = BOLT_D, h = BRACKET_T + 2);
    }
}

// Purchased parts. Modelled only so the checks can see their envelopes.
module washer() {
    difference() {
        cylinder(d = WASHER_OD, h = WASHER_T);
        translate([0, 0, -1]) cylinder(d = WASHER_ID, h = WASHER_T + 2);
    }
}

module m3_screw() {          // M3 x 8 pan head, origin at the underside of the head
    cylinder(d = 5.5, h = 2);
    translate([0, 0, -8]) cylinder(d = 3.0, h = 8);
}

base();
translate([0, 0, BASE_H]) washer();
translate([0, 0, PLATTER_Z]) platter();
translate([BOLT_R - BRACKET_W / 2, -BRACKET_W / 2, BASE_H]) bracket();
translate([BOLT_R, 0, BASE_H + BRACKET_T]) m3_screw();
